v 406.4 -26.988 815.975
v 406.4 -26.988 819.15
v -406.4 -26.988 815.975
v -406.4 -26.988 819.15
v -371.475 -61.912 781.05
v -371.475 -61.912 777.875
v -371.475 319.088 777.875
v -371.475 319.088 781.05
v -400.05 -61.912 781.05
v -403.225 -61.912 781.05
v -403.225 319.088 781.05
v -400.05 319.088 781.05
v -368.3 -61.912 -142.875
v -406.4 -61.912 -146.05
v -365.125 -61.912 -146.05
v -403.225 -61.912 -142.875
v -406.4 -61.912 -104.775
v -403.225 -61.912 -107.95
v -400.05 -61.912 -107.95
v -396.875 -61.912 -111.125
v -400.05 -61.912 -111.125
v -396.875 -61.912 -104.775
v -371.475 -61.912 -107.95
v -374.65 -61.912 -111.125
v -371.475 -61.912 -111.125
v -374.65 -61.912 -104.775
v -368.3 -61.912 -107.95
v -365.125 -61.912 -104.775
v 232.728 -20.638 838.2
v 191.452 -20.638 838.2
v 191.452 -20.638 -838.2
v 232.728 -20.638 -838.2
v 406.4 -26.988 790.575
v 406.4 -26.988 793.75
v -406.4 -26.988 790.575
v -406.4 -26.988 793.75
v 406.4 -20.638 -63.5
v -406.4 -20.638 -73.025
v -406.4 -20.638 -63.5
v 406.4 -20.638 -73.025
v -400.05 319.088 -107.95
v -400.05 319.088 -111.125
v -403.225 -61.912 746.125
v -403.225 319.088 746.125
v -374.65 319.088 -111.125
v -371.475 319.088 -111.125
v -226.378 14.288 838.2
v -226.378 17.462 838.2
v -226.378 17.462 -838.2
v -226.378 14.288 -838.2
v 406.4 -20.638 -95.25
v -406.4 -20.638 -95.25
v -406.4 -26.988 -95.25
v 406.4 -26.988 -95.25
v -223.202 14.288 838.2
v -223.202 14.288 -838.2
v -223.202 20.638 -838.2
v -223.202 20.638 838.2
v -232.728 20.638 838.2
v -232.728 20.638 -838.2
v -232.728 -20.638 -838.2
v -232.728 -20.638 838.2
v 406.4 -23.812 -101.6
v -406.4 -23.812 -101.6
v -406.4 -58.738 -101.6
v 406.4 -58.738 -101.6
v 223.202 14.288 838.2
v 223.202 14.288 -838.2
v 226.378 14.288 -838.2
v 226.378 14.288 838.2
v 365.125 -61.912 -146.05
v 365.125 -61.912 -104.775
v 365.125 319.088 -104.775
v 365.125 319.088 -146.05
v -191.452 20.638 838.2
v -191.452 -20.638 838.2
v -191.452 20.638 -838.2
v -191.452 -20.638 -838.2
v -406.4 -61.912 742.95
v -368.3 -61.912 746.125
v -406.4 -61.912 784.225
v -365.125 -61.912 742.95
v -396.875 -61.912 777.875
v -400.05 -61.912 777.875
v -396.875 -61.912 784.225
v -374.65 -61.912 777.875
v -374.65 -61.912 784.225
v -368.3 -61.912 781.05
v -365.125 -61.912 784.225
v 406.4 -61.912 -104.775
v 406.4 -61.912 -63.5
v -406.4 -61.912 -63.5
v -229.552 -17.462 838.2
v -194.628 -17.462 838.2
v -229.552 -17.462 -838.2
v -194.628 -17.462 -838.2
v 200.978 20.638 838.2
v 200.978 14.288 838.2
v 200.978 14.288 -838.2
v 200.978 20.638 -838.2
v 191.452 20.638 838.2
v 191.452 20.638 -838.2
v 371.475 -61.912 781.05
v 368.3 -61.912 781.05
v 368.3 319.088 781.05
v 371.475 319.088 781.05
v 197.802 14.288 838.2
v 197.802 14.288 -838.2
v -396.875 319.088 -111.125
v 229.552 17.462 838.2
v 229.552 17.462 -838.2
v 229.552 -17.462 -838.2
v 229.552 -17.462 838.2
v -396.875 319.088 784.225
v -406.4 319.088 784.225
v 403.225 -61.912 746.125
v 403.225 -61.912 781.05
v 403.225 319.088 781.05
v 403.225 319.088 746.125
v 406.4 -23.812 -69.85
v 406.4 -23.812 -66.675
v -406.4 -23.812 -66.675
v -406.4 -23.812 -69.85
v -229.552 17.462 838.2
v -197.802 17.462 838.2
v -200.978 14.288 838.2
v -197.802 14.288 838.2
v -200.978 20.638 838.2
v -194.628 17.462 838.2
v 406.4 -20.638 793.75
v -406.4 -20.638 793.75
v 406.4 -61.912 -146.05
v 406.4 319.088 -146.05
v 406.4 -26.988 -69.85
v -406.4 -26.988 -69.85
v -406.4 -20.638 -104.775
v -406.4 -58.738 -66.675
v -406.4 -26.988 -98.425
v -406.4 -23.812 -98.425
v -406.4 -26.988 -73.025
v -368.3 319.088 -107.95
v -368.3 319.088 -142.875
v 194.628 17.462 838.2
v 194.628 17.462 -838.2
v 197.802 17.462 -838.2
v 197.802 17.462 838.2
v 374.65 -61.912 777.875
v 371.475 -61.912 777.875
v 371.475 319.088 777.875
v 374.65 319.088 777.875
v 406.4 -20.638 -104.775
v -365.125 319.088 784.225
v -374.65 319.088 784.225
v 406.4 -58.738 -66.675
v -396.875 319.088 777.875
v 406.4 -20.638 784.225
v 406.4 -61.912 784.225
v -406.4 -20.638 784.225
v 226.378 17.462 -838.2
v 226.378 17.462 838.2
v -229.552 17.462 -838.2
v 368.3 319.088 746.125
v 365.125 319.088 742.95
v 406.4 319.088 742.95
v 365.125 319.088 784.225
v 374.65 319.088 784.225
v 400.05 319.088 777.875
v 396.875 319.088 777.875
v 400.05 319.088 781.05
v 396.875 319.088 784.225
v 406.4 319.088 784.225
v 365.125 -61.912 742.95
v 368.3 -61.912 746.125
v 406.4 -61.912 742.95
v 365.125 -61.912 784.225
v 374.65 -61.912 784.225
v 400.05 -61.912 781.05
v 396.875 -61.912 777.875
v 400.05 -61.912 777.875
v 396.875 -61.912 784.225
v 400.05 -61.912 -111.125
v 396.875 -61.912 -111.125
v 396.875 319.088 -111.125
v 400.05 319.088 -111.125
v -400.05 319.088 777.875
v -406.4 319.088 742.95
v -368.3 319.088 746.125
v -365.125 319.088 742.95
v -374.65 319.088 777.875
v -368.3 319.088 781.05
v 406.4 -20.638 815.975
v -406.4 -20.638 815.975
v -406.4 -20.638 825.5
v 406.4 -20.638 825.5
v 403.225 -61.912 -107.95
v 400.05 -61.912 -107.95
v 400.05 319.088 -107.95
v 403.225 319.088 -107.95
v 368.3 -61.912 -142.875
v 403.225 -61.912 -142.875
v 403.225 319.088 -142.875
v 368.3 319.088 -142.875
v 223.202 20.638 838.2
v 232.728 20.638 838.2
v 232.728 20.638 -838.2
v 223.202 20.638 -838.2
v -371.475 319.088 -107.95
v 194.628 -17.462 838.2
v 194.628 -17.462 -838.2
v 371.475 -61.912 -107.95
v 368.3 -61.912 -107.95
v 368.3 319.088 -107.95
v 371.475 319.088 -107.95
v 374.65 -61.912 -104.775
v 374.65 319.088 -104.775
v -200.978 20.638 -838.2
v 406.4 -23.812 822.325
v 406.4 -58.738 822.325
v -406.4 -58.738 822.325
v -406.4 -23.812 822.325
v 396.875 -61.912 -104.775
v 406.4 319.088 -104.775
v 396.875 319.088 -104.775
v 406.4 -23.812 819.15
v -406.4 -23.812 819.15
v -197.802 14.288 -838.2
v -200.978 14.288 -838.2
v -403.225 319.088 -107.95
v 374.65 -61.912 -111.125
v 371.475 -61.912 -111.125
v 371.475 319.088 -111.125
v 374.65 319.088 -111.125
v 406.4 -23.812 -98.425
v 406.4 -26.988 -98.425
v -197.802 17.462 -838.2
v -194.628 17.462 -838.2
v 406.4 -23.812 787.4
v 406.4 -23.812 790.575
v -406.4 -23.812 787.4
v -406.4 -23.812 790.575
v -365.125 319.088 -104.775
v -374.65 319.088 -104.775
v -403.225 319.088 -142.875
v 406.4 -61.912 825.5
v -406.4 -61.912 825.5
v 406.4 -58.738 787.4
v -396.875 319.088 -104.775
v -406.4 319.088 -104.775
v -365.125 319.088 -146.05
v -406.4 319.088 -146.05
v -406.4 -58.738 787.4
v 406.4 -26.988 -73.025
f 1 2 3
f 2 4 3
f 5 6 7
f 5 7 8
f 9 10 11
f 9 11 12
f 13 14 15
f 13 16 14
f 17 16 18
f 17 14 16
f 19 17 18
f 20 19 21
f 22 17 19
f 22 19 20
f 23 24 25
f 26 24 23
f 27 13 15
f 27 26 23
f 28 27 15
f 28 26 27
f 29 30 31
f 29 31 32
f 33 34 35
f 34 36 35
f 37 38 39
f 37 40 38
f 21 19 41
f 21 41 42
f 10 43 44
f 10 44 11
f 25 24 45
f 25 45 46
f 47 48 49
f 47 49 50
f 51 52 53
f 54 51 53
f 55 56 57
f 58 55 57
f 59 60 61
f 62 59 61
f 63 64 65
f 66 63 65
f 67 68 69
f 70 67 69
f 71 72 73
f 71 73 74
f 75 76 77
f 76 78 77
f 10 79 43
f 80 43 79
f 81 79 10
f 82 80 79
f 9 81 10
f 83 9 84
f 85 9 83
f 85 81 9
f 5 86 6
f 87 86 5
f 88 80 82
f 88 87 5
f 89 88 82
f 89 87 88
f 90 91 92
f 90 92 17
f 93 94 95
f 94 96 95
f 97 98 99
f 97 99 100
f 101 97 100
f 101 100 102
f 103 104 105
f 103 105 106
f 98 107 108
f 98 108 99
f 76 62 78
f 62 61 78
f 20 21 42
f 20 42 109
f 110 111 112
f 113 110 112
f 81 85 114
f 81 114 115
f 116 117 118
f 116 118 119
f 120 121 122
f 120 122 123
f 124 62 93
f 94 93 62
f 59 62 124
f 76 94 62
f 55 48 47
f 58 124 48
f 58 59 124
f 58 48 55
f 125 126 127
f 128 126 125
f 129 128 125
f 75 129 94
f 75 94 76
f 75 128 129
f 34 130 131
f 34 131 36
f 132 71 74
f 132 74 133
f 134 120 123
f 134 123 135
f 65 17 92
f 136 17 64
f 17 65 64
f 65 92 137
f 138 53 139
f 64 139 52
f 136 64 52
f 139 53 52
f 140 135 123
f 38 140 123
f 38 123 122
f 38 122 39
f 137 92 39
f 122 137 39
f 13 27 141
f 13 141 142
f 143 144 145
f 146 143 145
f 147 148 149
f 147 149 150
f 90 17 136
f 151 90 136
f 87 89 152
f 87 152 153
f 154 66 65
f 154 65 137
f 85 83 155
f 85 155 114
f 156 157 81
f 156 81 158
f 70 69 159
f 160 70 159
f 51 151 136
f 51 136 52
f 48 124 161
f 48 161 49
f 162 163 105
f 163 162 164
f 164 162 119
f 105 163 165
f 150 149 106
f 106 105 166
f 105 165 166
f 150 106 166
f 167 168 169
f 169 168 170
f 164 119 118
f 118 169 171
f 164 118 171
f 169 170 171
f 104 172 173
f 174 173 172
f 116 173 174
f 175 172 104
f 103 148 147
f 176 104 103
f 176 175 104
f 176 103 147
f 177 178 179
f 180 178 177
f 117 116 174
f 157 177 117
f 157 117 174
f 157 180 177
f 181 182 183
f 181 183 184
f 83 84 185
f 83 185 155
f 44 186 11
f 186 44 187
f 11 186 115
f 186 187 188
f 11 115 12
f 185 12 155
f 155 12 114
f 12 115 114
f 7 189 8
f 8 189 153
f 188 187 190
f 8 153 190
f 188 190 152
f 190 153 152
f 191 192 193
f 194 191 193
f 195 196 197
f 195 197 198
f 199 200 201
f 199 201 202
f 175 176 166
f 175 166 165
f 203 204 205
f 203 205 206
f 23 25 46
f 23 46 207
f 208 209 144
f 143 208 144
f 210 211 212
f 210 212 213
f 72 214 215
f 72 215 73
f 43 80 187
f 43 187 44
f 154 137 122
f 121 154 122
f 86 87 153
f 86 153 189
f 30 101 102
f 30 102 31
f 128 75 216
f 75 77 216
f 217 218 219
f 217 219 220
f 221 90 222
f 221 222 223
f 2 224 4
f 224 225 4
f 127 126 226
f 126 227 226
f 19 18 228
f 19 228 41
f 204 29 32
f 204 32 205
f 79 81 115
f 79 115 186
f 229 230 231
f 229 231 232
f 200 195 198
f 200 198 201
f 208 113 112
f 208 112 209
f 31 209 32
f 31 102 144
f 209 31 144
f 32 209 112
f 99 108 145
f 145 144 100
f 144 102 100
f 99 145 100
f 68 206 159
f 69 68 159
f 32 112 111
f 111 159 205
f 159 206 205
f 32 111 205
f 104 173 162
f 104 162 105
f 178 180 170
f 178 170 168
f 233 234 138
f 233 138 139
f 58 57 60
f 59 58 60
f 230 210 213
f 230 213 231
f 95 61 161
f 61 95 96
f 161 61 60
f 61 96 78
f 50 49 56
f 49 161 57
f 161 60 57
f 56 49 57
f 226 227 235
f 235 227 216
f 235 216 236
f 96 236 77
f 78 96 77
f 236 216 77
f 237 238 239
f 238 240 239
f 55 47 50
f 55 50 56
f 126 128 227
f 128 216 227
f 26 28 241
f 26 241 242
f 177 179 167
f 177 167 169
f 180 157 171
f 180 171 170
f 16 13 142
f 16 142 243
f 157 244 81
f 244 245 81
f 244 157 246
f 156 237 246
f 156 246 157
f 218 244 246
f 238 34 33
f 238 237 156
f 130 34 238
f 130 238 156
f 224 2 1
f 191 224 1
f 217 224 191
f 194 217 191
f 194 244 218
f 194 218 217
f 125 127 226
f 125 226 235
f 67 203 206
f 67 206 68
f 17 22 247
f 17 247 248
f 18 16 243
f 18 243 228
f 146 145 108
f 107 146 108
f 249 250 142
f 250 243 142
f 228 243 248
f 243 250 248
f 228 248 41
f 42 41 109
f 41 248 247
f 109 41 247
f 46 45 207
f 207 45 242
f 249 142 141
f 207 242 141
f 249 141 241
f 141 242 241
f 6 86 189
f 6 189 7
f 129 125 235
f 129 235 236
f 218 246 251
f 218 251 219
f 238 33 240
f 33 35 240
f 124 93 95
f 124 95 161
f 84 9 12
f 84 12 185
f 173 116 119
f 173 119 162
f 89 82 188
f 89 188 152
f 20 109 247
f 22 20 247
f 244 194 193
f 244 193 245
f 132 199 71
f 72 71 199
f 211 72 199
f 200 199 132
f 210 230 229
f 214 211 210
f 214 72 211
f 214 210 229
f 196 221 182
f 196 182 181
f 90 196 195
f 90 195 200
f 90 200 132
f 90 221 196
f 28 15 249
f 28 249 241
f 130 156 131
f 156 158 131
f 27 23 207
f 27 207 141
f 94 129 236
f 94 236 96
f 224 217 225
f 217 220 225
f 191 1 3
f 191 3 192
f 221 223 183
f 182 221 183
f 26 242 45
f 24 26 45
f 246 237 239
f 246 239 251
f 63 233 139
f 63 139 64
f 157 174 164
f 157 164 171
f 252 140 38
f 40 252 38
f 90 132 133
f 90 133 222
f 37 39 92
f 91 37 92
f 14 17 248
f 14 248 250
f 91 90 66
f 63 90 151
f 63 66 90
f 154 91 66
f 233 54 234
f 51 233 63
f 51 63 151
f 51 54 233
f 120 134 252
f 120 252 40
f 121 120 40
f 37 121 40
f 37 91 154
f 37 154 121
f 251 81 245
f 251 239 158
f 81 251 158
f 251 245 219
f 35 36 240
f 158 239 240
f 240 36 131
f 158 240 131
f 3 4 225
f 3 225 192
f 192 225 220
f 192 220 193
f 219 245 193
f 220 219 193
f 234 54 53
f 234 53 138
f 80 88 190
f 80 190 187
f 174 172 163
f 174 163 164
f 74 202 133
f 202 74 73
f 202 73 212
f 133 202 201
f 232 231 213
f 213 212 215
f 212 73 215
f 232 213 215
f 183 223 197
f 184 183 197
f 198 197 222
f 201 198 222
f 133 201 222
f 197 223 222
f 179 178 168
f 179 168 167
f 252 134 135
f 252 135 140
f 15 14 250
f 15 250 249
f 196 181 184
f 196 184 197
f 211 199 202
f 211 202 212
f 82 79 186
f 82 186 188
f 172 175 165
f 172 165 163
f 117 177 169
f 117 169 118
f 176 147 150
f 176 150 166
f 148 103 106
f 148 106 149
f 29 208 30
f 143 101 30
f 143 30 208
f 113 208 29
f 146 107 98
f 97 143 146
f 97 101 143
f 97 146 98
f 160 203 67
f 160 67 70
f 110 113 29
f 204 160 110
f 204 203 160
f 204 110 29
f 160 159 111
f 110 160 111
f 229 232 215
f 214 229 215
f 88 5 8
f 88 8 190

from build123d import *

# Parameters (mm, degrees)
F1_DEPTH = 838.2
F3_DEPTH = 406.4
F5_DEPTH = 381


with BuildPart() as f1:
    # F0 (on Top) → F1 (new body, symmetric)
    with BuildSketch(Plane.XY):
        Polygon((-232.7275, 20.6375), (-232.7275, -20.6375), (-191.4525, -20.6375), (-191.4525, 20.6375), (-200.9775, 20.6375), (-200.9775, 14.2875), (-197.8025, 14.2875), (-197.8025, 17.4625), (-194.6275, 17.4625), (-194.6275, -17.4625), (-229.5525, -17.4625), (-229.5525, 17.4625), (-226.3775, 17.4625), (-226.3775, 14.2875), (-223.2025, 14.2875), (-223.2025, 20.6375), align=None)
        Polygon((197.8025, 17.4625), (197.8025, 14.2875), (200.9775, 14.2875), (200.9775, 20.6375), (191.4525, 20.6375), (191.4525, -20.6375), (232.7275, -20.6375), (232.7275, 20.6375), (223.2025, 20.6375), (223.2025, 14.2875), (226.3775, 14.2875), (226.3775, 17.4625), (229.5525, 17.4625), (229.5525, -17.4625), (194.6275, -17.4625), (194.6275, 17.4625), align=None)
    extrude(amount=F1_DEPTH, both=True)


with BuildPart() as f3:
    # F2 (on Right) → F3 (new body, symmetric)
    with BuildSketch(Plane.YZ):
        Polygon((-20.6375, 825.5), (-61.9125, 825.5), (-61.9125, 784.225), (-20.6375, 784.225), (-20.6375, 793.75), (-26.9875, 793.75), (-26.9875, 790.575), (-23.8125, 790.575), (-23.8125, 787.4), (-58.7375, 787.4), (-58.7375, 822.325), (-23.8125, 822.325), (-23.8125, 819.15), (-26.9875, 819.15), (-26.9875, 815.975), (-20.6375, 815.975), align=None)
        Polygon((-20.6375, -63.5), (-61.9125, -63.5), (-61.9125, -104.775), (-20.6375, -104.775), (-20.6375, -95.25), (-26.9875, -95.25), (-26.9875, -98.425), (-23.8125, -98.425), (-23.8125, -101.6), (-58.7375, -101.6), (-58.7375, -66.675), (-23.8125, -66.675), (-23.8125, -69.85), (-26.9875, -69.85), (-26.9875, -73.025), (-20.6375, -73.025), align=None)
    extrude(amount=F3_DEPTH, both=True)


with BuildPart() as f5:
    # F4 (on face) → F5 (new body)
    with BuildSketch(Plane.XZ.offset(61.9125)):
        Polygon((-400.05, 781.05), (-400.05, 777.875), (-396.875, 777.875), (-396.875, 784.225), (-406.4, 784.225), (-406.4, 742.95), (-365.125, 742.95), (-365.125, 784.225), (-374.65, 784.225), (-374.65, 777.875), (-371.475, 777.875), (-371.475, 781.05), (-368.3, 781.05), (-368.3, 746.125), (-403.225, 746.125), (-403.225, 781.05), align=None)
        Polygon((-396.875, -104.775), (-406.4, -104.775), (-406.4, -146.05), (-365.125, -146.05), (-365.125, -104.775), (-374.65, -104.775), (-374.65, -111.125), (-371.475, -111.125), (-371.475, -107.95), (-368.3, -107.95), (-368.3, -142.875), (-403.225, -142.875), (-403.225, -107.95), (-400.05, -107.95), (-400.05, -111.125), (-396.875, -111.125), align=None)
        Polygon((374.65, 784.225), (365.125, 784.225), (365.125, 742.95), (406.4, 742.95), (406.4, 784.225), (396.875, 784.225), (396.875, 777.875), (400.05, 777.875), (400.05, 781.05), (403.225, 781.05), (403.225, 746.125), (368.3, 746.125), (368.3, 781.05), (371.475, 781.05), (371.475, 777.875), (374.65, 777.875), align=None)
        Polygon((374.65, -104.775), (365.125, -104.775), (365.125, -146.05), (406.4, -146.05), (406.4, -104.775), (396.875, -104.775), (396.875, -111.125), (400.05, -111.125), (400.05, -107.95), (403.225, -107.95), (403.225, -142.875), (368.3, -142.875), (368.3, -107.95), (371.475, -107.95), (371.475, -111.125), (374.65, -111.125), align=None)
    extrude(amount=-F5_DEPTH)


solid = Compound([f1.part, f3.part, f5.part])
